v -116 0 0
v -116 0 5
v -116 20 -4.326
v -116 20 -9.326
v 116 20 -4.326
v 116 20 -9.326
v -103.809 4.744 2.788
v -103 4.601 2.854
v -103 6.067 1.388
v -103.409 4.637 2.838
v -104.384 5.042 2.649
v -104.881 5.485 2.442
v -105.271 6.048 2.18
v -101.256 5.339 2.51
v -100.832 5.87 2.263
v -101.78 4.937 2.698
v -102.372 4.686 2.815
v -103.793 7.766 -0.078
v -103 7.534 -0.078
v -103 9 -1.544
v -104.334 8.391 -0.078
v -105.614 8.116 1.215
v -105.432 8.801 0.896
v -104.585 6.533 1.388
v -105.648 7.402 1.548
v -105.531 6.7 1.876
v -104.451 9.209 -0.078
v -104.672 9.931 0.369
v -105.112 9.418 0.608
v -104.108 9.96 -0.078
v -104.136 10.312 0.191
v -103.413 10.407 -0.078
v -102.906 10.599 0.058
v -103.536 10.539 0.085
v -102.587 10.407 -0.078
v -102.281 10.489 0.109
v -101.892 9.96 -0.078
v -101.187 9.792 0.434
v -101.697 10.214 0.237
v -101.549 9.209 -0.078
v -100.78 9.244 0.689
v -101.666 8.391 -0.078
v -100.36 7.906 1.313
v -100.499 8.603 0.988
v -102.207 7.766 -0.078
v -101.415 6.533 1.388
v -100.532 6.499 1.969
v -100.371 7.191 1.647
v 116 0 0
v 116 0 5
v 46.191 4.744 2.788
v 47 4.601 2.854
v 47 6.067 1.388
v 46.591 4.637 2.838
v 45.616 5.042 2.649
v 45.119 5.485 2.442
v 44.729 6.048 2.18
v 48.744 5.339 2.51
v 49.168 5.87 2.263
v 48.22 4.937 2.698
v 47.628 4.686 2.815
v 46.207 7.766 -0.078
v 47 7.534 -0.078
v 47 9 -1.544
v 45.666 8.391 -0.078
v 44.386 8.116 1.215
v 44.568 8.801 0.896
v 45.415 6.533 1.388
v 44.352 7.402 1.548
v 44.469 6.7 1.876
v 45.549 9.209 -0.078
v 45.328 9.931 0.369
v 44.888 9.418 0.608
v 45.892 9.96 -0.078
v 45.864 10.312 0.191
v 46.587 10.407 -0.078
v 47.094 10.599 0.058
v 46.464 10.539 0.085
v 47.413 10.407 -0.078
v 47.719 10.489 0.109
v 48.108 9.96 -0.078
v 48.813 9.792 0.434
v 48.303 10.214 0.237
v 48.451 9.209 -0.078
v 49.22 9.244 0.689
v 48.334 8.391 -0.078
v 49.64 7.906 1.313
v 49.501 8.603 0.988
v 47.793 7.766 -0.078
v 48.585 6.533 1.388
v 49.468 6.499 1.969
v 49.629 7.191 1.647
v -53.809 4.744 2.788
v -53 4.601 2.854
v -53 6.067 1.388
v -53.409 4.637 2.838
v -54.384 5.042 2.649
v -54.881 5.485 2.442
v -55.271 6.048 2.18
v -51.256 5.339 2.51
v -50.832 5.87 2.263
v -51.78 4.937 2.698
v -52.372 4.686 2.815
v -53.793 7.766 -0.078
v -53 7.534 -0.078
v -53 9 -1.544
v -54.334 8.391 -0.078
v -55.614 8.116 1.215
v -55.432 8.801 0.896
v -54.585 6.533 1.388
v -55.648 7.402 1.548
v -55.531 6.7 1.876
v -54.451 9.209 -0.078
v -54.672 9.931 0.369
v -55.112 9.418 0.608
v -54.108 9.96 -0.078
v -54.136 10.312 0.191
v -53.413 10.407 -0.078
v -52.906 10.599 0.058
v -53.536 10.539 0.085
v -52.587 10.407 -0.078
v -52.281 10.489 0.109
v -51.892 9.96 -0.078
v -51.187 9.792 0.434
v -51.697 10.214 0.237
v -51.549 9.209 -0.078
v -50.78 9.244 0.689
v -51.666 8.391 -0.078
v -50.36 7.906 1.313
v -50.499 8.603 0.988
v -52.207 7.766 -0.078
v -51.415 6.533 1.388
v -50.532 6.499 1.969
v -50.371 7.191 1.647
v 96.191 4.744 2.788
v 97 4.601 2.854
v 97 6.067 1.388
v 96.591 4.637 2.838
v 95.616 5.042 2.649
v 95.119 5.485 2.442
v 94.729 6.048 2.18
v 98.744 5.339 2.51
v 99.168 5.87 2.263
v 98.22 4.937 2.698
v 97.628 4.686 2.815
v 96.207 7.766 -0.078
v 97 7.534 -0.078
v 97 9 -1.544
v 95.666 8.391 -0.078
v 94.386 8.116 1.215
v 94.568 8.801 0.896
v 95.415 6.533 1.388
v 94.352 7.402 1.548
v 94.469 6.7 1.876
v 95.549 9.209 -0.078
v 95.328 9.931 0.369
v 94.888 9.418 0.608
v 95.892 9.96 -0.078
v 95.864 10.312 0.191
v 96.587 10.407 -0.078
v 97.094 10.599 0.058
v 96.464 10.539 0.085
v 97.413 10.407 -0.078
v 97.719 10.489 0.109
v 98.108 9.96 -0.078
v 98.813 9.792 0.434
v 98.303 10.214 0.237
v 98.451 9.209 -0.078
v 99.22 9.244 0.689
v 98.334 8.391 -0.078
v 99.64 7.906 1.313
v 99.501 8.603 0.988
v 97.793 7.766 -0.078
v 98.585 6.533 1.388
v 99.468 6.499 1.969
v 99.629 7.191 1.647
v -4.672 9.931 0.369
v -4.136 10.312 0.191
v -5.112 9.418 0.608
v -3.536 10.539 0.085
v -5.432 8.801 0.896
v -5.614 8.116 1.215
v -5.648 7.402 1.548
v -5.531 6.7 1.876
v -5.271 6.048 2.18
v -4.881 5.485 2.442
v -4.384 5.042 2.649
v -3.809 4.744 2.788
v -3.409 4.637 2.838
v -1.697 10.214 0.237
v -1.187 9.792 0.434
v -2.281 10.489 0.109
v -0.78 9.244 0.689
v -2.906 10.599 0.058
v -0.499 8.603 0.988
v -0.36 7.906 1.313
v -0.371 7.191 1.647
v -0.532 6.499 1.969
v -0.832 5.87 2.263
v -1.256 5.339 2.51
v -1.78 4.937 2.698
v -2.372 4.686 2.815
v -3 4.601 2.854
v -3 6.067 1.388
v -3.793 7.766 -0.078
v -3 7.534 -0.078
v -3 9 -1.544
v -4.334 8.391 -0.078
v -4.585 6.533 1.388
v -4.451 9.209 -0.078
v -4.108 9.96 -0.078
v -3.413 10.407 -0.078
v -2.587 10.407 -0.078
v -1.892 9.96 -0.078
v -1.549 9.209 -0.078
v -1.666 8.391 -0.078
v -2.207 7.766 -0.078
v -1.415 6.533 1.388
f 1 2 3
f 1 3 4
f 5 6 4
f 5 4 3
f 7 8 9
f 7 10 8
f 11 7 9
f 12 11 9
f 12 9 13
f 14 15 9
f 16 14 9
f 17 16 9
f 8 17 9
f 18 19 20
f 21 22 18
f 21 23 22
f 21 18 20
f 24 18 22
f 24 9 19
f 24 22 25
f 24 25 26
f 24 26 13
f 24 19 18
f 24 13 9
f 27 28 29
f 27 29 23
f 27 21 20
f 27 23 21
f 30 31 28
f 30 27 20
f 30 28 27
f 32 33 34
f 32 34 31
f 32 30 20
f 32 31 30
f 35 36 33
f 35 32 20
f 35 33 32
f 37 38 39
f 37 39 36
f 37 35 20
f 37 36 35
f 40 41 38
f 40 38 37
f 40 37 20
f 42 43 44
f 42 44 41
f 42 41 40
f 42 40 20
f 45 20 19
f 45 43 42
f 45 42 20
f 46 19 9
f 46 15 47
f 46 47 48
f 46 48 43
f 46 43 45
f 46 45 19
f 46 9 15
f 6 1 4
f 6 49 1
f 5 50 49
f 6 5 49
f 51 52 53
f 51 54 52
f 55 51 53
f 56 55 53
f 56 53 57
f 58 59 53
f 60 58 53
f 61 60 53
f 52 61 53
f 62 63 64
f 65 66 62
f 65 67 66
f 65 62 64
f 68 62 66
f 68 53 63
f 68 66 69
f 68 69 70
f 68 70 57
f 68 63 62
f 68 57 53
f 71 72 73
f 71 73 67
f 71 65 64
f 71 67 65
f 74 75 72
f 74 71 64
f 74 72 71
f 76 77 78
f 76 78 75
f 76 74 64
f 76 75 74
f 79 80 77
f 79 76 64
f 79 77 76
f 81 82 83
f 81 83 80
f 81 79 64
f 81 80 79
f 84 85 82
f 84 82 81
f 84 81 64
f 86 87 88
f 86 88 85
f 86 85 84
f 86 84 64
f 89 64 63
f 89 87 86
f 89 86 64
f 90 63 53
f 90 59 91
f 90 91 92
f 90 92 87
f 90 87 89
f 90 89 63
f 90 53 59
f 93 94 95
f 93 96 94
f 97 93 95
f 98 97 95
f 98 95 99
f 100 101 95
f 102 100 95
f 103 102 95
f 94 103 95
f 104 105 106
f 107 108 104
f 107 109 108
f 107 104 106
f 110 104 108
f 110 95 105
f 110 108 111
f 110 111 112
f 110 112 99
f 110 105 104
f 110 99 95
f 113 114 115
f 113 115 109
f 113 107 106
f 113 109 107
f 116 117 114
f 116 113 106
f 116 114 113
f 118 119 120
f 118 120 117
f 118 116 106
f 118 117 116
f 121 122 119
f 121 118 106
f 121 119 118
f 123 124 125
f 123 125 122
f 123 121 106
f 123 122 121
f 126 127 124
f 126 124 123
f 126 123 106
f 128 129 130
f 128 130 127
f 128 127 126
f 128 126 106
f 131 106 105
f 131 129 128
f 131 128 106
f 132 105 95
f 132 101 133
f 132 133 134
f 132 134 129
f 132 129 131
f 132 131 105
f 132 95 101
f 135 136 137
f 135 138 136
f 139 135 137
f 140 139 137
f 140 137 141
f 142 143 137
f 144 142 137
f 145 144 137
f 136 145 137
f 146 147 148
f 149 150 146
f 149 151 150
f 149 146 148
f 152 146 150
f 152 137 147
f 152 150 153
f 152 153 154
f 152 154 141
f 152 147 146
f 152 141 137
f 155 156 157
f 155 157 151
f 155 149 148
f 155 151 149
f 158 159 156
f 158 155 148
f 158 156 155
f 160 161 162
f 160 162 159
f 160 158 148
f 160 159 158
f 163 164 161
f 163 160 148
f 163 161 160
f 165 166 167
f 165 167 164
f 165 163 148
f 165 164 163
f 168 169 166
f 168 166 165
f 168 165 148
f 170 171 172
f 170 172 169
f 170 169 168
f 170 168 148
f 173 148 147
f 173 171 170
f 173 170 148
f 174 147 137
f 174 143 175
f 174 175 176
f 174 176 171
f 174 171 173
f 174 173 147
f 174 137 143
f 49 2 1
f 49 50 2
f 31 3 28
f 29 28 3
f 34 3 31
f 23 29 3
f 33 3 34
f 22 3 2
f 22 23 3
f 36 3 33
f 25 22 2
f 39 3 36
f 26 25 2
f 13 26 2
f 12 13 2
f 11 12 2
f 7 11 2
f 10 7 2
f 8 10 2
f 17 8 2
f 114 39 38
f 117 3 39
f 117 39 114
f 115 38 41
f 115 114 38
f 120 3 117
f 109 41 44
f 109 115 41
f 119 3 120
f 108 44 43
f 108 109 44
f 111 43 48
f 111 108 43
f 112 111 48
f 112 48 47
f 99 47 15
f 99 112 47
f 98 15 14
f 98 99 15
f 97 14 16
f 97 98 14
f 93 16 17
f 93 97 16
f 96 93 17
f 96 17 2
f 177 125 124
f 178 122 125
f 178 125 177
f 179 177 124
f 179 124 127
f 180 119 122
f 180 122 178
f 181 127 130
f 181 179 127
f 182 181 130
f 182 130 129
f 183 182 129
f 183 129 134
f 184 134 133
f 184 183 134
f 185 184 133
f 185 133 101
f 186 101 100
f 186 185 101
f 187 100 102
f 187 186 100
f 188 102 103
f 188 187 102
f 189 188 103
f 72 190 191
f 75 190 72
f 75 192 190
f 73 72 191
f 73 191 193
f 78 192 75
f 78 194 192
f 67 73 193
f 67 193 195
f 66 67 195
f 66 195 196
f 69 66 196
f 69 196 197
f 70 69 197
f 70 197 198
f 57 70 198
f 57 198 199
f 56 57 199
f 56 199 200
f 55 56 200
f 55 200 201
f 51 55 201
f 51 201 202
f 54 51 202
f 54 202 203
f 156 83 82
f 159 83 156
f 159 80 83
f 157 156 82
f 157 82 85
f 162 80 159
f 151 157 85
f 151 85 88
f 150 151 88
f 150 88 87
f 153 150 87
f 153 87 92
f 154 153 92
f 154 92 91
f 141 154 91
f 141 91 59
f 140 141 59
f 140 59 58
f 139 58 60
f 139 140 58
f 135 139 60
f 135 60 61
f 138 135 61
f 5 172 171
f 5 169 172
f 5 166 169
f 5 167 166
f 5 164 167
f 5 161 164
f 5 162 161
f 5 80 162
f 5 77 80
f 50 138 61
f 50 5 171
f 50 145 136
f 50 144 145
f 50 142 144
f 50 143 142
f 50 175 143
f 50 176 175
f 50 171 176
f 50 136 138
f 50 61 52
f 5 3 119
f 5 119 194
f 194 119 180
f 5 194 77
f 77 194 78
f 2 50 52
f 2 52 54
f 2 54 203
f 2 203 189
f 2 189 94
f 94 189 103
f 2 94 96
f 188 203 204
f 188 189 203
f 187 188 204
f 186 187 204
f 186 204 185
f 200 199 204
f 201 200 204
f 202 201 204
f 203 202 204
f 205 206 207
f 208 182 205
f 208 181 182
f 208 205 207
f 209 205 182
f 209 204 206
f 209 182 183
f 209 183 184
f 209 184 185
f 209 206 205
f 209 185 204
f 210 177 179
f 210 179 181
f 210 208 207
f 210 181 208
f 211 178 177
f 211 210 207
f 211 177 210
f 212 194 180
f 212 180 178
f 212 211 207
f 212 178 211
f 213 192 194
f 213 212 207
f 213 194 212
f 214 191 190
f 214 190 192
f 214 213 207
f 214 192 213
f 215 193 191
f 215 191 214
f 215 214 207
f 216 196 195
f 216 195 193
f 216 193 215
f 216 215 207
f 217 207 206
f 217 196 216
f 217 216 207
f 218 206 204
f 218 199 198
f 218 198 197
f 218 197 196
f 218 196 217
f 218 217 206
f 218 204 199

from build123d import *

# Parameters (mm, degrees)
BOSS_EXTRUDE1_DEPTH = 116
LPATTERN1_COUNT     = 5
LPATTERN1_PITCH     = 50


with BuildPart() as part:
    # Sketch1 → Boss-Extrude1 (new, symmetric)
    with BuildSketch(Plane(origin=(0, 0, 0), x_dir=(0, 0, -1), z_dir=(1, 0, 0))):
        Polygon((0, 0), (9.326153163099908, 19.999999999999996), (4.326153163099911, 19.999999999999996), (-5.000000000000001, -8.7e-16), align=None)
    extrude(amount=BOSS_EXTRUDE1_DEPTH, both=True)

    # Sketch3 → Cut-Revolve1 (revolve, cut)
    with BuildSketch(Plane.ZY.offset(103.00000000000001)):
        Polygon((-1.5444404272329906, 8.999999999999998), (2.854482547232013, 4.601077025535014), (0.8032310766050411, 8.999999999999998), align=None)
    cut_revolve1 = revolve(axis=Axis((-103.00000000000001, 9.000000000000002, 9.024012903581264), (0, -1.5e-16, -1)), mode=Mode.SUBTRACT)

    # LPattern1: Cut-Revolve1 ×5
    with Locations(*[(i * LPATTERN1_PITCH, 0, 0) for i in range(1, LPATTERN1_COUNT)]):
        add(cut_revolve1, mode=Mode.SUBTRACT)


solid = part.part
